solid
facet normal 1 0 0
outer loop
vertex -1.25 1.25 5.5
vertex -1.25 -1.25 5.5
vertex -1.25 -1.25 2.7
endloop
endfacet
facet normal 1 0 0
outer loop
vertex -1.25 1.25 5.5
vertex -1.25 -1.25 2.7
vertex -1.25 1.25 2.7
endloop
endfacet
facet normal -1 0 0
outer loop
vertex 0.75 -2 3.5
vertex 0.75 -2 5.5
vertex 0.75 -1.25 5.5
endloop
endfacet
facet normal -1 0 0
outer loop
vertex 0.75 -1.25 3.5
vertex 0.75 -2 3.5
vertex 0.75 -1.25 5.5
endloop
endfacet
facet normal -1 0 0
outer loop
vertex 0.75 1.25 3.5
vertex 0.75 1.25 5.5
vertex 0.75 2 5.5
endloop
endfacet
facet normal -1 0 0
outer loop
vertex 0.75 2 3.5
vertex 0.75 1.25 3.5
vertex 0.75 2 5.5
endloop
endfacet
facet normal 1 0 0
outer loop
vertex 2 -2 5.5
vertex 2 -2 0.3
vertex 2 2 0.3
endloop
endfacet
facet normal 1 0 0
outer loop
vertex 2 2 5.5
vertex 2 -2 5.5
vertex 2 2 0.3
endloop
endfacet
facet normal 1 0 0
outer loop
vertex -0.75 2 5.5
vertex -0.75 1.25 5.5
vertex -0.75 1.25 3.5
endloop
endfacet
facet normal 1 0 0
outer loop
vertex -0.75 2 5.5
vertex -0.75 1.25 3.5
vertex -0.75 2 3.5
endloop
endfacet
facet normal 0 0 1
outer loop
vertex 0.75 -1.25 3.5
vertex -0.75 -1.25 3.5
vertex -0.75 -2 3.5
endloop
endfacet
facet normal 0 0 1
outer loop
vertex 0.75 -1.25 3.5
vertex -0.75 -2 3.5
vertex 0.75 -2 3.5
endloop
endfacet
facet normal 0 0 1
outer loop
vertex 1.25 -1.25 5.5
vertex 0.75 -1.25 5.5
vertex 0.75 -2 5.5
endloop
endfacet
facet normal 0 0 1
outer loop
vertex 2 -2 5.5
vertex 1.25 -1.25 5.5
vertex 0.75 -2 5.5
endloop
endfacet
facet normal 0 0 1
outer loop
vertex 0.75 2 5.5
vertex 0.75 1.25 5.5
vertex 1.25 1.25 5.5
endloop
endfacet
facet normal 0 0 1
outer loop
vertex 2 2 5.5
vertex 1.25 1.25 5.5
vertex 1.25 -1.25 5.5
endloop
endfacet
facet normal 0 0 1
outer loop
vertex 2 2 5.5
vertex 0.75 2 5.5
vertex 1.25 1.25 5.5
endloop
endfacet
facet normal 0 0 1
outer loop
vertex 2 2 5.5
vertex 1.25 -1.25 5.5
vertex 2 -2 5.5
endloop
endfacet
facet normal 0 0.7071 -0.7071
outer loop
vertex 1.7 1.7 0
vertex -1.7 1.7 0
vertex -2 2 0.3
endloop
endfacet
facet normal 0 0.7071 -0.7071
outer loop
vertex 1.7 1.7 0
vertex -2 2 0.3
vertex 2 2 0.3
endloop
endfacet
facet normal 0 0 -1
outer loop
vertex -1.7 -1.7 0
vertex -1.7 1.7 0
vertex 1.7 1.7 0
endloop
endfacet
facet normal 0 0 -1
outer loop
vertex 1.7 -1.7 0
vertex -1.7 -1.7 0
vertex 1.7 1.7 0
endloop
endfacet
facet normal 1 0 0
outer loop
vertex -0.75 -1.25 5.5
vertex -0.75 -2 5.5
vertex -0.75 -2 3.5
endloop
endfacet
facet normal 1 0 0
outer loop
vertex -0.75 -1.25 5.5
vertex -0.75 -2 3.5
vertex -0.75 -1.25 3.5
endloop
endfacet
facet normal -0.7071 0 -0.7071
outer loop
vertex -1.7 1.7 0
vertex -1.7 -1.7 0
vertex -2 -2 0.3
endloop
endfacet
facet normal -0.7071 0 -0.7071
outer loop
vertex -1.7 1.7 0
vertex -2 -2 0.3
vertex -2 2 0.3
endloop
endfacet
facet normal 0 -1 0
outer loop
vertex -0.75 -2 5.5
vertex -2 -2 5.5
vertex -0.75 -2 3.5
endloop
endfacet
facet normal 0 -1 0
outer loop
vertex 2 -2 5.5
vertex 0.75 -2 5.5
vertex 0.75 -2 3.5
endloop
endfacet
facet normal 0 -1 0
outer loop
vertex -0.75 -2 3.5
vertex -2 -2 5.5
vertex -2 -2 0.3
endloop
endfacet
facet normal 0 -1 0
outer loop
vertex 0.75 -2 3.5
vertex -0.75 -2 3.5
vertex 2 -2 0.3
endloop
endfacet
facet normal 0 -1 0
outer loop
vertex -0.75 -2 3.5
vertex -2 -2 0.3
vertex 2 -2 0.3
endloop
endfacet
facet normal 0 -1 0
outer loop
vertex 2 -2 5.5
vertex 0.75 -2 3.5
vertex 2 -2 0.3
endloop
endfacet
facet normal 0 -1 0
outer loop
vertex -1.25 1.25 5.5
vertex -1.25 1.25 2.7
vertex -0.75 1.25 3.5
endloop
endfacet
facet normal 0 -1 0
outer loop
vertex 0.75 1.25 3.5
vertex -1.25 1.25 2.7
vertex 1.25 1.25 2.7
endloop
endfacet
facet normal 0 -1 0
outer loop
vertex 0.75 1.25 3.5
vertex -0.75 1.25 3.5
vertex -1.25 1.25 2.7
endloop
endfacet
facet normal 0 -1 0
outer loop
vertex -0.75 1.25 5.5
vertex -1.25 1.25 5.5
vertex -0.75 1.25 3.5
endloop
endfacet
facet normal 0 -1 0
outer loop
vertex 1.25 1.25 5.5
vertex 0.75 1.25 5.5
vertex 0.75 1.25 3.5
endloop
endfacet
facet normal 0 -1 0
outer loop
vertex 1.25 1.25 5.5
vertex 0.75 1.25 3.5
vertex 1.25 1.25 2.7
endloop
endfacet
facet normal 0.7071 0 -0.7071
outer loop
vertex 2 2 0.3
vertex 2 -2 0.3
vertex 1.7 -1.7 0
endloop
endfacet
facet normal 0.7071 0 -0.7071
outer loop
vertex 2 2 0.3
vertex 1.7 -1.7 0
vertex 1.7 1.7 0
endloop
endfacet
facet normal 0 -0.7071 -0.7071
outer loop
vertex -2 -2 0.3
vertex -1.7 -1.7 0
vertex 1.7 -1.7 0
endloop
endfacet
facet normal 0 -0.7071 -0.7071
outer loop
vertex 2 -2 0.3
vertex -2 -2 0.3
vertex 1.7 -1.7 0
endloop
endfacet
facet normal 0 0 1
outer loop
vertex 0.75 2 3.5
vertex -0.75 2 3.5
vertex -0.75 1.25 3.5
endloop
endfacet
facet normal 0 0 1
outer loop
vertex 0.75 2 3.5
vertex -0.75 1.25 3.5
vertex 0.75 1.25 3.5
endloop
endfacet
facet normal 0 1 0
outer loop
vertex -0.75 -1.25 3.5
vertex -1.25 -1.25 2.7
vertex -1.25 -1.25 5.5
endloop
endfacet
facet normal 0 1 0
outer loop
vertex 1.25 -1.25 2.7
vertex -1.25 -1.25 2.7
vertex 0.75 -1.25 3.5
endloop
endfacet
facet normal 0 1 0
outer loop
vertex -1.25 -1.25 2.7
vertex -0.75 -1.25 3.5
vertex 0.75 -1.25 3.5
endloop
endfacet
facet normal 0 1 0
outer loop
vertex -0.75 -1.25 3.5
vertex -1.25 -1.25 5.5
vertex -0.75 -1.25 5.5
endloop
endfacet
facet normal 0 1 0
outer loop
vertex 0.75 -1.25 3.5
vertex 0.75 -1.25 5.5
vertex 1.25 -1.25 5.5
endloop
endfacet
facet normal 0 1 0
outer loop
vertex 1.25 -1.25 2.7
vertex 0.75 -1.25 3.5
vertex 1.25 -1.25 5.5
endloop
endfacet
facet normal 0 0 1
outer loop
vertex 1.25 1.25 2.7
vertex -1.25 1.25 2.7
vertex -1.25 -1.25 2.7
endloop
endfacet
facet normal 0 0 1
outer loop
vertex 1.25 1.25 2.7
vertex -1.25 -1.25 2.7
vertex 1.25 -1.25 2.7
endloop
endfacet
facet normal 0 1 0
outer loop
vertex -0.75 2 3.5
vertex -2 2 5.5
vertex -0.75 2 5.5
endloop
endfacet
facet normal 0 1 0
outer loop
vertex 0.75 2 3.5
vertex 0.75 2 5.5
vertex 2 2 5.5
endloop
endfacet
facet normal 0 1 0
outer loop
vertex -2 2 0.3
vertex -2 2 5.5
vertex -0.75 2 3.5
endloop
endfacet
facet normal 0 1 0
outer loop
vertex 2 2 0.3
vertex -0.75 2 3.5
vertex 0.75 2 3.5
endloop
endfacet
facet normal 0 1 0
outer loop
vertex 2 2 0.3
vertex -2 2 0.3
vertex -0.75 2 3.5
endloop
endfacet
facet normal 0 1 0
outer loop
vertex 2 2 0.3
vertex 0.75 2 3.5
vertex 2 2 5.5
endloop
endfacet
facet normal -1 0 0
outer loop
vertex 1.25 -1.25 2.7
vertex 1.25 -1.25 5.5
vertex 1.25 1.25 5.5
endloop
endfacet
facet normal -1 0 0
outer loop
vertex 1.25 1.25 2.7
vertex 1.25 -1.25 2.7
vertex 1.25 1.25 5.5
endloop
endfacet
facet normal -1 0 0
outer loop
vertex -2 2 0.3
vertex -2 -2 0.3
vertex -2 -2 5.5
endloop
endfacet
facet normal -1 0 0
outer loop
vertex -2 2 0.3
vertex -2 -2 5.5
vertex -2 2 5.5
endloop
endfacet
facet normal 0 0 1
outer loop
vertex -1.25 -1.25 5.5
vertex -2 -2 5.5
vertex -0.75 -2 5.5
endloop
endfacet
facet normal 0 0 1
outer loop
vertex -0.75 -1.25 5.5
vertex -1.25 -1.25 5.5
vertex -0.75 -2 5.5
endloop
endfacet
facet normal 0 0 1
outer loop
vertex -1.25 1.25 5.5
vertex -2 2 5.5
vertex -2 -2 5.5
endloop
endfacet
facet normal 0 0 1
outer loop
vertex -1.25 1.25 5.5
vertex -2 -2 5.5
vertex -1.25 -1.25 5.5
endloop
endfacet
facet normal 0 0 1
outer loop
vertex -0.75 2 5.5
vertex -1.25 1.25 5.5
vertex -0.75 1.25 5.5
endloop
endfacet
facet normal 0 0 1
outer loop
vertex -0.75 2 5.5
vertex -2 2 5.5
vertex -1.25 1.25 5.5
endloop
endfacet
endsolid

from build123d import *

# Parameters (mm, degrees)
SKETCH_W        = 4
SKETCH_H        = 4
PAD_DEPTH       = 5.5
SKETCH001_W     = 2.5
SKETCH001_H     = 2.5
POCKET_DEPTH    = 2.8
SKETCH002_W     = 1.5
SKETCH002_H     = 4
POCKET001_DEPTH = 2
CHAMFER_SIZE    = 0.3


with BuildPart() as part:
    # Sketch → Pad (new body)
    with BuildSketch(Plane.XY):
        Rectangle(SKETCH_W, SKETCH_H)
    extrude(amount=PAD_DEPTH)

    # Sketch001 (on DatumPlane) → Pocket (cut)
    with BuildSketch(Plane.XY.offset(5.5)):
        Rectangle(SKETCH001_W, SKETCH001_H)
    extrude(amount=-POCKET_DEPTH, mode=Mode.SUBTRACT)

    # Sketch002 (on DatumPlane) → Pocket001 (cut)
    with BuildSketch(Plane.XY.offset(5.5)):
        Rectangle(SKETCH002_W, SKETCH002_H)
    extrude(amount=-POCKET001_DEPTH, mode=Mode.SUBTRACT)

    # Chamfer
    chamfer_edges = [part.edges().sort_by_distance(p)[0] for p in [
        (0, 2, 0),
        (-2, 0, 0),
        (0, -2, 0),
        (2, 0, 0),
    ]]
    chamfer(chamfer_edges, length=CHAMFER_SIZE)


solid = part.part
